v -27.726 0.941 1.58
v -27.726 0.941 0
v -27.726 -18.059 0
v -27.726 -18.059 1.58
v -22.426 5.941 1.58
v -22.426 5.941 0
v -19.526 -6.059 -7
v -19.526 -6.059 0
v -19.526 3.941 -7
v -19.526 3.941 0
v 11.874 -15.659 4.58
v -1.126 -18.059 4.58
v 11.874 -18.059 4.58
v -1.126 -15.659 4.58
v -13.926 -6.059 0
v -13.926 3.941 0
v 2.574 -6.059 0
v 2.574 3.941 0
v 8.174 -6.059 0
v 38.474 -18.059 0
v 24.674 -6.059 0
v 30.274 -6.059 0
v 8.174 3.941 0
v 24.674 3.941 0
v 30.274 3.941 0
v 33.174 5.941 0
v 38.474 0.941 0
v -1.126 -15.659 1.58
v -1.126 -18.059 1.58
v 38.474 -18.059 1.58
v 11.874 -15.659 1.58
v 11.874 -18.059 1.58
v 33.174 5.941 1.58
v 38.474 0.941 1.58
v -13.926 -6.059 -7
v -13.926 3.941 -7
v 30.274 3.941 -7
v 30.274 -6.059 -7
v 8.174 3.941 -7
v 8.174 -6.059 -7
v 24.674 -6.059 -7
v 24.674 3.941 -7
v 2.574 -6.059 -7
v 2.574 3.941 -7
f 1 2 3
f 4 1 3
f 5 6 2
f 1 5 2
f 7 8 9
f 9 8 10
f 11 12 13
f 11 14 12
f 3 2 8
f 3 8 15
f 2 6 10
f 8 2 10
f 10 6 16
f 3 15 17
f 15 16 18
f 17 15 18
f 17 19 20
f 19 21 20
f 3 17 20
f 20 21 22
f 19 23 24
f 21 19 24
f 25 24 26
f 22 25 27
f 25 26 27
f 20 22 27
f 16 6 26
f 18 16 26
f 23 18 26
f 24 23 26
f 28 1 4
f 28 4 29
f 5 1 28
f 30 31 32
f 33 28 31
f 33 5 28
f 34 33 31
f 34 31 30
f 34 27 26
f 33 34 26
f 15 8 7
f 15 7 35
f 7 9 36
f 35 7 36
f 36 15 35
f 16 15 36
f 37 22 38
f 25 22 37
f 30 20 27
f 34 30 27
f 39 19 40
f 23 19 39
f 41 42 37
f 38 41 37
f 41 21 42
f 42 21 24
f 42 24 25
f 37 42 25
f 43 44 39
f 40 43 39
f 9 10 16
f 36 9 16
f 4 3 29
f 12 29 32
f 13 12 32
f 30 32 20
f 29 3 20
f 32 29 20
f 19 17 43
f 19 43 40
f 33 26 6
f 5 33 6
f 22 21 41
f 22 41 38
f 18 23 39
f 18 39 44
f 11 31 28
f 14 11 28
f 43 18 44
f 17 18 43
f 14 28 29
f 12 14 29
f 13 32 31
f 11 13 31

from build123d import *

# Parameters (mm, degrees)
F0_W     = 5.6
F0_H     = 10
F1_DEPTH = 7
F2_DEPTH = 1.58
F4_DEPTH = 3


with BuildPart() as f1:
    # F0 (on Top) → F1 (new body)
    with BuildSketch(Plane.XY):
        with Locations((-16.725898, -1.059211)):
            Rectangle(F0_W, F0_H)
        Polygon((8.174102, 3.940789), (5.374102, 3.940789), (2.574102, 3.940789), (2.574102, -6.059211), (8.174102, -6.059211), align=None)
        with Locations((27.474102, -1.059211)):
            Rectangle(F0_W, F0_H)
    extrude(amount=-F1_DEPTH)

    # F0 (on Top) → F2 (join)
    with BuildSketch(Plane.XY):
        Polygon((33.174102, 5.940789), (-22.425898, 5.940789), (-27.725898, 0.940789), (-27.725898, -18.059211), (38.474102, -18.059211), (38.474102, 0.940789), align=None)
        with Locations((-16.725898, -1.059211)):
            Rectangle(F0_W, F0_H, mode=Mode.SUBTRACT)
        Polygon((2.574102, 3.940789), (5.374102, 3.940789), (8.174102, 3.940789), (8.174102, -6.059211), (2.574102, -6.059211), align=None, mode=Mode.SUBTRACT)
        with Locations((27.474102, -1.059211)):
            Rectangle(F0_W, F0_H, mode=Mode.SUBTRACT)
        with Locations((-16.725898, -1.059211)):
            Rectangle(F0_W, F0_H)
        Polygon((8.174102, 3.940789), (5.374102, 3.940789), (2.574102, 3.940789), (2.574102, -6.059211), (8.174102, -6.059211), align=None)
        with Locations((27.474102, -1.059211)):
            Rectangle(F0_W, F0_H)
    extrude(amount=F2_DEPTH)

    # F3 (on face) → F4 (join)
    with BuildSketch(Plane.XY.offset(1.58)):
        Polygon((-1.125898, -18.059211), (5.374102, -18.059211), (11.874102, -18.059211), (11.874102, -15.659211), (-1.125898, -15.659211), align=None)
    extrude(amount=F4_DEPTH)


solid = f1.part
